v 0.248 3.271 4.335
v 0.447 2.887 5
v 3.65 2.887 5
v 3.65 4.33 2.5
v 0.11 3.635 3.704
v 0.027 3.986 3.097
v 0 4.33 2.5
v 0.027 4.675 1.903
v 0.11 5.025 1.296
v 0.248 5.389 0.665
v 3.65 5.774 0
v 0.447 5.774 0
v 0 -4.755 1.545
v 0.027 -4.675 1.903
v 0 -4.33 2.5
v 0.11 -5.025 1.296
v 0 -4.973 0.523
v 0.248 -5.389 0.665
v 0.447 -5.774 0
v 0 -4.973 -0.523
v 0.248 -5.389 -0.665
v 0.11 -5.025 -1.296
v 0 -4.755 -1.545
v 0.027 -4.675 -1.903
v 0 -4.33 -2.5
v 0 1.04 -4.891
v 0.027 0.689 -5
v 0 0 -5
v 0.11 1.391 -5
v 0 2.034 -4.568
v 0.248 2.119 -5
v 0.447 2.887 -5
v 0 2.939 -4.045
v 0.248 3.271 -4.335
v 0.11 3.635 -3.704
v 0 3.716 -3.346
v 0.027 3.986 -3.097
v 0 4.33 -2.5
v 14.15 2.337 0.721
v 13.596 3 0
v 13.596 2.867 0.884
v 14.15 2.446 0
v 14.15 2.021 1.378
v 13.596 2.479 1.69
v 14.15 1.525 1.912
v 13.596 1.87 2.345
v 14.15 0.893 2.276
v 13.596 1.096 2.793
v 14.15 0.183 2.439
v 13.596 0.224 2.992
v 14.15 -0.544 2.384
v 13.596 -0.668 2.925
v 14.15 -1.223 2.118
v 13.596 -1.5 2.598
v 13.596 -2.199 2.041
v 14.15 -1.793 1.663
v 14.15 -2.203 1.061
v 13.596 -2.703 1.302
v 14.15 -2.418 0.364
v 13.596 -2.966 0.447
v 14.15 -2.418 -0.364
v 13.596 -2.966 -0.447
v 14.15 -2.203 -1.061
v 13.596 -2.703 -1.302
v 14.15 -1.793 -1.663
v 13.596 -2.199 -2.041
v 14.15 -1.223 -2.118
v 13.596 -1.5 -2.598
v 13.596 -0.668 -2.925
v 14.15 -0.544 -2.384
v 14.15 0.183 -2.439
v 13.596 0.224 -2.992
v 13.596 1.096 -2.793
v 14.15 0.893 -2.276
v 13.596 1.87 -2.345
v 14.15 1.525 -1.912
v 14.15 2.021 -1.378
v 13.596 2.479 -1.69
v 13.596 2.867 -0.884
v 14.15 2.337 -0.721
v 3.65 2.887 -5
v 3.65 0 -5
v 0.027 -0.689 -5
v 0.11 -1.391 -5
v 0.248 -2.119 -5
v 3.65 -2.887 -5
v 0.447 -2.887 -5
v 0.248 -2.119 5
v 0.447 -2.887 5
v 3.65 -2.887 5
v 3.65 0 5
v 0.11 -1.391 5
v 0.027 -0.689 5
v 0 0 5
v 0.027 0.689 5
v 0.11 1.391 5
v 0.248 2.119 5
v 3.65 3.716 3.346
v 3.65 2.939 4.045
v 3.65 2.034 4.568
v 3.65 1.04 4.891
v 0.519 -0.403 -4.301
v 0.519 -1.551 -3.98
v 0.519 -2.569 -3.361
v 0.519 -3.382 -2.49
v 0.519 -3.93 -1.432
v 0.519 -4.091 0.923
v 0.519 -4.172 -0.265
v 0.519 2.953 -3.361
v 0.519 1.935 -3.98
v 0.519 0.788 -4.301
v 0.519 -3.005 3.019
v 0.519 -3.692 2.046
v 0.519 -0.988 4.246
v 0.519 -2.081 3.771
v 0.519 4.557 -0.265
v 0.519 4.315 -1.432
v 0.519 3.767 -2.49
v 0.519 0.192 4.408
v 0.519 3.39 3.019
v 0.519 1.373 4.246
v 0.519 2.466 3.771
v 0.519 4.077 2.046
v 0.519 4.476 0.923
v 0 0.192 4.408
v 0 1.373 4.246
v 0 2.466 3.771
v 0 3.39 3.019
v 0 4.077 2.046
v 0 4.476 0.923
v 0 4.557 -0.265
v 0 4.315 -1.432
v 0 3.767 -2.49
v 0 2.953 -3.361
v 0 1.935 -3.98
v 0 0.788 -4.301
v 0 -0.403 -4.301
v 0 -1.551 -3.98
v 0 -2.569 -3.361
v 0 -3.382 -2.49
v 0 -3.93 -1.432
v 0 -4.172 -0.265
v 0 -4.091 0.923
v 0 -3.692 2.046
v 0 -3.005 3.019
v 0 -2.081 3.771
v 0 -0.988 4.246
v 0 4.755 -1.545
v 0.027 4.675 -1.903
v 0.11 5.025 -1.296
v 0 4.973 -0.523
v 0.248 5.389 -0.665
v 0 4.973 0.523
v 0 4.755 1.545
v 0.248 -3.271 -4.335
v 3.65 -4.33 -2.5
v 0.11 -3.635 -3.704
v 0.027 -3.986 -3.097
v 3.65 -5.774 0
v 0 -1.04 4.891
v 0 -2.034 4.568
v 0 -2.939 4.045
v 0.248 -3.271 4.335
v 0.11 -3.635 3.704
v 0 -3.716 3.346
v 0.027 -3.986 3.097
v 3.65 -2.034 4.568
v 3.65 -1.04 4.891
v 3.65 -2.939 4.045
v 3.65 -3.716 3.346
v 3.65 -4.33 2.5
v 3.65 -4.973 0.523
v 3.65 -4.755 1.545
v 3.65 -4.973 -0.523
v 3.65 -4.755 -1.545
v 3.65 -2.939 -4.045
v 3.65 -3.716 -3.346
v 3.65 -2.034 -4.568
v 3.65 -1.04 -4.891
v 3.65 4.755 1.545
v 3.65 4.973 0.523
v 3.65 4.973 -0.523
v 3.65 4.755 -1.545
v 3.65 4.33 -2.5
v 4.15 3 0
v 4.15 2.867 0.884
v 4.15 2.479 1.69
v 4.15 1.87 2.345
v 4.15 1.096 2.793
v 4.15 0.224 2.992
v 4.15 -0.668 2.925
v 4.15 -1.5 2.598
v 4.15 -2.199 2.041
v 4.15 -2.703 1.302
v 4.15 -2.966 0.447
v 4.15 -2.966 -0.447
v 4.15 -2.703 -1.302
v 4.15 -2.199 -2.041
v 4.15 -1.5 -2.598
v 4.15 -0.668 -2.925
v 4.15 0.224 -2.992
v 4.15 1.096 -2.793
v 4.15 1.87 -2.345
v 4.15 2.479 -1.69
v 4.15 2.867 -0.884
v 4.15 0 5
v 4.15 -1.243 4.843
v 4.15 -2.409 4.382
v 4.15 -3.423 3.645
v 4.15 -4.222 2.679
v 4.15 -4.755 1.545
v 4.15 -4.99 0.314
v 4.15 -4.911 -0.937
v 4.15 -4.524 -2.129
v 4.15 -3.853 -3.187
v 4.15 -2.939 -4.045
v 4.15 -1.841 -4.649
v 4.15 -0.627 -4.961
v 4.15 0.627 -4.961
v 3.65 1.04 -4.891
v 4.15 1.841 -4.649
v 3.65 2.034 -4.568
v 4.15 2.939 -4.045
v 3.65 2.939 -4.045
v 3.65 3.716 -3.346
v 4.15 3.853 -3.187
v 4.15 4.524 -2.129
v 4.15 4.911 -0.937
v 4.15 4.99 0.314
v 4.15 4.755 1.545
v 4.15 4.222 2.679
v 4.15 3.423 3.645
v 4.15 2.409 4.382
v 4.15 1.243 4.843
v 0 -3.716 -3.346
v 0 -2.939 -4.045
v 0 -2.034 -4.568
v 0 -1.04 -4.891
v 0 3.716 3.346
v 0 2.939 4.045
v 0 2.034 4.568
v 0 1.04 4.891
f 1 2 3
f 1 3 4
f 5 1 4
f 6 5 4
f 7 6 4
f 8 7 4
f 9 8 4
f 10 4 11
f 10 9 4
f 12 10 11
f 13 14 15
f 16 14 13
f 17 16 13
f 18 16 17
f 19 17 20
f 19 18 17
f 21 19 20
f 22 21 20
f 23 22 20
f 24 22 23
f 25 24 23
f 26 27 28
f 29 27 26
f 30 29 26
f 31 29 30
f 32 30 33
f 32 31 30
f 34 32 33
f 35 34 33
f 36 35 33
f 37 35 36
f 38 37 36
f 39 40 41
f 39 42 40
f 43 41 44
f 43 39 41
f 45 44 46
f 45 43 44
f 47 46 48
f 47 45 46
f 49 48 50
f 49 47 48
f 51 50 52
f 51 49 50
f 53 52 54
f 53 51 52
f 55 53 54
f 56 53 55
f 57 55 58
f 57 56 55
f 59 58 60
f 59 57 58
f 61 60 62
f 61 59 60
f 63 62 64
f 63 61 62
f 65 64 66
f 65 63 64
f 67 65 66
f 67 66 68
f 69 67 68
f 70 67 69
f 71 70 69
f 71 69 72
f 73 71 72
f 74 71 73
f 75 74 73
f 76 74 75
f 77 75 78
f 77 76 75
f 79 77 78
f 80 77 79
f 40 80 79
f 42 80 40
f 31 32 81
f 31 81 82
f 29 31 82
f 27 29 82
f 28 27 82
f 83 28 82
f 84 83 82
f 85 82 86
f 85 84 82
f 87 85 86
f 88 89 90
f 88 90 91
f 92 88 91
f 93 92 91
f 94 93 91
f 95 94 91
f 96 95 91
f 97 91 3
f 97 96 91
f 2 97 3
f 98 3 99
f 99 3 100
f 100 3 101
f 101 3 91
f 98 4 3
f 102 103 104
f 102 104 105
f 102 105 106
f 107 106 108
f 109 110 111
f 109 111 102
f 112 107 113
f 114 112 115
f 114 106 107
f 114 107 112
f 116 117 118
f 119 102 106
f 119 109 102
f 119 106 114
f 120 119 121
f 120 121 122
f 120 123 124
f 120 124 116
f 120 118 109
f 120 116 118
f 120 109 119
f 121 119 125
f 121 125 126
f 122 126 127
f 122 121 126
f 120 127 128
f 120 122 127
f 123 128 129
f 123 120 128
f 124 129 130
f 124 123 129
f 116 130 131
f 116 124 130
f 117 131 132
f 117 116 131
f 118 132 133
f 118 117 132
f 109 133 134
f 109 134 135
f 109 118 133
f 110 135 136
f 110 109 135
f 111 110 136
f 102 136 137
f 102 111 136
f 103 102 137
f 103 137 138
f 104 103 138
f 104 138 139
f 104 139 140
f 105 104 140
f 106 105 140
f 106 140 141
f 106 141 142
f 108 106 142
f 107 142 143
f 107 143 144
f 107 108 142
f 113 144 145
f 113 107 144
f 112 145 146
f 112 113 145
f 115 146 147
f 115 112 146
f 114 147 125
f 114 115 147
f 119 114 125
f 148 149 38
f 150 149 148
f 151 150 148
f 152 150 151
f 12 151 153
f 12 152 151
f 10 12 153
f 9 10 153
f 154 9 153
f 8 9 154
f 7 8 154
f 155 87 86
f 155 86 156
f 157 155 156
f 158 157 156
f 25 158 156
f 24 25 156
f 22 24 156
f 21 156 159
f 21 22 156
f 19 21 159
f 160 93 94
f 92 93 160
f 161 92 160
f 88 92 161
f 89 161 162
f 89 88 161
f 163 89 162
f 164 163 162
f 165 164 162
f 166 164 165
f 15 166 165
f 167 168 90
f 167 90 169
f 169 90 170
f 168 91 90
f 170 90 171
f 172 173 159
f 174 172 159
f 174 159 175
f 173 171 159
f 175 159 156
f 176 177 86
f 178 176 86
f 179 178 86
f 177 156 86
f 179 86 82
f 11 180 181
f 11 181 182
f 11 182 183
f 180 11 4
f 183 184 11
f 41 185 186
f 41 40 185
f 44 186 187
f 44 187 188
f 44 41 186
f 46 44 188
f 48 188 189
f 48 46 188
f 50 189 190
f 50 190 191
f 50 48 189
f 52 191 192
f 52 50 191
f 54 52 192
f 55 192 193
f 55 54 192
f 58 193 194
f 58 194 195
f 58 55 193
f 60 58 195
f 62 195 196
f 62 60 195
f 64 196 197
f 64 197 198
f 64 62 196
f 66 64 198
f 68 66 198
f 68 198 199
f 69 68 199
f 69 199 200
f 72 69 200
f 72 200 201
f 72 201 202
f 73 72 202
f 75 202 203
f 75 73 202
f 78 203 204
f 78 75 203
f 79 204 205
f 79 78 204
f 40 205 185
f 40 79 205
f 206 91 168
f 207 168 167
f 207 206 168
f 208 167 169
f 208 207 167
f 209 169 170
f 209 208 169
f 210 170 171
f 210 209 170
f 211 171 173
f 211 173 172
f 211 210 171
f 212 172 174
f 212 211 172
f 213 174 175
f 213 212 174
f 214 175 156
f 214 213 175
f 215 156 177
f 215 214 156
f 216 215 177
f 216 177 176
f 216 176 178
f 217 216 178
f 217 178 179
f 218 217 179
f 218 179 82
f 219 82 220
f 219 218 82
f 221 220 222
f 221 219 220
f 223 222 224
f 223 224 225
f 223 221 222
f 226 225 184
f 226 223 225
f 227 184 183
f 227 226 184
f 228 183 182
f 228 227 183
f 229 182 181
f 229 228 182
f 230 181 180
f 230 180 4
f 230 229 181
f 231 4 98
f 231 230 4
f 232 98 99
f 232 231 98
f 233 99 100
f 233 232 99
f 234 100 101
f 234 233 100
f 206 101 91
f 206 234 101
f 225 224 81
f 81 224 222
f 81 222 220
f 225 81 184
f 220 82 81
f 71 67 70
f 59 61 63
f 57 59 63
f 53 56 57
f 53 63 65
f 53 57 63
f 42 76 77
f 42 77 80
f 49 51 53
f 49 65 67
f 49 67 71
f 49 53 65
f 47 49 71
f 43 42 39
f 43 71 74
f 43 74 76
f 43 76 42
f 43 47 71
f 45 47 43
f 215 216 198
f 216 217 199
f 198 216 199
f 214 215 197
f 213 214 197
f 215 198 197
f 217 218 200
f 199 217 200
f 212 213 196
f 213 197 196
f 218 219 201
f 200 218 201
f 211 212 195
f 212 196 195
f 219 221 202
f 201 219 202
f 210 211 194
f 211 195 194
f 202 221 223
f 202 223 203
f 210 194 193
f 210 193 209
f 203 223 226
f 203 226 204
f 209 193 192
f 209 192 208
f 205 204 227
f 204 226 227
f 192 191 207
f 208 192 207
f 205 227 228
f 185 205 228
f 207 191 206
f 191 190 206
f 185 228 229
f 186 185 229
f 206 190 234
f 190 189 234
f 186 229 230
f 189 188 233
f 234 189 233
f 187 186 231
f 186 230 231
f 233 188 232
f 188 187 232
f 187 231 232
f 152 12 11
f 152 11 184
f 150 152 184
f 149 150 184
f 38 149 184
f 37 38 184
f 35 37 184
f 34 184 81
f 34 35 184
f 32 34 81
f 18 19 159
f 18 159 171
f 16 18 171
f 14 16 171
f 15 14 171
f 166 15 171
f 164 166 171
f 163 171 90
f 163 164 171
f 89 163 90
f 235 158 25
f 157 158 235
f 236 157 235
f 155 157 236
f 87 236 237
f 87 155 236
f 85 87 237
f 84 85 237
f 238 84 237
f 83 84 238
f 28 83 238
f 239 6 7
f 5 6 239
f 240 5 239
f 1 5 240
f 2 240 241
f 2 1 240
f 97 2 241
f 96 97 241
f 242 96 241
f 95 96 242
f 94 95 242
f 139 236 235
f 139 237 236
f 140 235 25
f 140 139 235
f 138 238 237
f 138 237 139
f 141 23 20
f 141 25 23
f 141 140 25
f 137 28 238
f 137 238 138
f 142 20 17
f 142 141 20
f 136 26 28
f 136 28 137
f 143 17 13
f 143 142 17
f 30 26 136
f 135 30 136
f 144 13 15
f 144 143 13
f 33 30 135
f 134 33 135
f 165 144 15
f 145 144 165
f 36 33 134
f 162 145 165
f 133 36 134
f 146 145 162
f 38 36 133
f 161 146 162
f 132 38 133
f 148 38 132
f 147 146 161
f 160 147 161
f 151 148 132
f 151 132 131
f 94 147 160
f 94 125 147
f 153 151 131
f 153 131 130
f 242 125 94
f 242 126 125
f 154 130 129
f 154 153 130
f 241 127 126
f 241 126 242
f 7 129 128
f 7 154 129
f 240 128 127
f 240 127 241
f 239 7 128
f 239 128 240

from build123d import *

# Parameters (mm, degrees)
BASEHEAD_DEPTH     = 4.15
INDENT_START       = -0.51875
INDENT_2_OUTLINE_R = 4.375
INDENT_2_DEPTH     = 0.51875
SKETCH4_W          = 0.5
SKETCH4_H          = 10.773502692


# Read off the part's stored shape, not the designer's step: Indent
with BuildPart() as part:
    # Sketch1 → BaseHead (new body)
    with BuildSketch(Plane(origin=(0, 0, 0), x_dir=(0, 0, -1), z_dir=(1, 0, 0))):
        Polygon((5, 2.886751346), (5, -2.886751346), (0, -5.773502692), (-5, -2.886751346), (-5, 2.886751346), (0, 5.773502692), align=None)
    extrude(amount=BASEHEAD_DEPTH)

    # Indent outline → Indent (revolve)
    with BuildSketch(Plane.YX):
        Polygon((3, 4.15), (3, 13.5955), (2.4455, 14.15), (0, 14.15), (0, 4.15), align=None)
    revolve(axis=Axis((0, 0, 0), (1, 0, 0)))

    # Indent 2 outline → Indent 2 (cut)
    with BuildSketch(Plane.ZY.offset(INDENT_START)):
        with Locations((0.033212245, 0.192376607)):
            Circle(INDENT_2_OUTLINE_R)
    extrude(amount=INDENT_2_DEPTH, mode=Mode.SUBTRACT)

    # Sketch3 → HeadChamfer (revolve, cut)
    with BuildSketch(Plane.XY, mode=Mode.PRIVATE) as headchamfer_sk:
        Polygon((0, 5), (3.333333333, 10.773502692), (3.333333333, 15.773502692), (-10, 15.773502692), (-10, 5), align=None)
    revolve(headchamfer_sk.sketch.rotate(Axis((0, 0, 0), (1, 0, 0)), 90), axis=Axis((0, 0, 0), (1, 0, 0)), mode=Mode.SUBTRACT)

    # Sketch4 → BearingFace (revolve, cut)
    with BuildSketch(Plane.XY, mode=Mode.PRIVATE) as bearingface_sk:
        with Locations((3.9, 10.386751346)):
            Rectangle(SKETCH4_W, SKETCH4_H)
    revolve(bearingface_sk.sketch.rotate(Axis((0, 0, 0), (1, 0, 0)), 90), axis=Axis((0, 0, 0), (1, 0, 0)), mode=Mode.SUBTRACT)


solid = part.part
